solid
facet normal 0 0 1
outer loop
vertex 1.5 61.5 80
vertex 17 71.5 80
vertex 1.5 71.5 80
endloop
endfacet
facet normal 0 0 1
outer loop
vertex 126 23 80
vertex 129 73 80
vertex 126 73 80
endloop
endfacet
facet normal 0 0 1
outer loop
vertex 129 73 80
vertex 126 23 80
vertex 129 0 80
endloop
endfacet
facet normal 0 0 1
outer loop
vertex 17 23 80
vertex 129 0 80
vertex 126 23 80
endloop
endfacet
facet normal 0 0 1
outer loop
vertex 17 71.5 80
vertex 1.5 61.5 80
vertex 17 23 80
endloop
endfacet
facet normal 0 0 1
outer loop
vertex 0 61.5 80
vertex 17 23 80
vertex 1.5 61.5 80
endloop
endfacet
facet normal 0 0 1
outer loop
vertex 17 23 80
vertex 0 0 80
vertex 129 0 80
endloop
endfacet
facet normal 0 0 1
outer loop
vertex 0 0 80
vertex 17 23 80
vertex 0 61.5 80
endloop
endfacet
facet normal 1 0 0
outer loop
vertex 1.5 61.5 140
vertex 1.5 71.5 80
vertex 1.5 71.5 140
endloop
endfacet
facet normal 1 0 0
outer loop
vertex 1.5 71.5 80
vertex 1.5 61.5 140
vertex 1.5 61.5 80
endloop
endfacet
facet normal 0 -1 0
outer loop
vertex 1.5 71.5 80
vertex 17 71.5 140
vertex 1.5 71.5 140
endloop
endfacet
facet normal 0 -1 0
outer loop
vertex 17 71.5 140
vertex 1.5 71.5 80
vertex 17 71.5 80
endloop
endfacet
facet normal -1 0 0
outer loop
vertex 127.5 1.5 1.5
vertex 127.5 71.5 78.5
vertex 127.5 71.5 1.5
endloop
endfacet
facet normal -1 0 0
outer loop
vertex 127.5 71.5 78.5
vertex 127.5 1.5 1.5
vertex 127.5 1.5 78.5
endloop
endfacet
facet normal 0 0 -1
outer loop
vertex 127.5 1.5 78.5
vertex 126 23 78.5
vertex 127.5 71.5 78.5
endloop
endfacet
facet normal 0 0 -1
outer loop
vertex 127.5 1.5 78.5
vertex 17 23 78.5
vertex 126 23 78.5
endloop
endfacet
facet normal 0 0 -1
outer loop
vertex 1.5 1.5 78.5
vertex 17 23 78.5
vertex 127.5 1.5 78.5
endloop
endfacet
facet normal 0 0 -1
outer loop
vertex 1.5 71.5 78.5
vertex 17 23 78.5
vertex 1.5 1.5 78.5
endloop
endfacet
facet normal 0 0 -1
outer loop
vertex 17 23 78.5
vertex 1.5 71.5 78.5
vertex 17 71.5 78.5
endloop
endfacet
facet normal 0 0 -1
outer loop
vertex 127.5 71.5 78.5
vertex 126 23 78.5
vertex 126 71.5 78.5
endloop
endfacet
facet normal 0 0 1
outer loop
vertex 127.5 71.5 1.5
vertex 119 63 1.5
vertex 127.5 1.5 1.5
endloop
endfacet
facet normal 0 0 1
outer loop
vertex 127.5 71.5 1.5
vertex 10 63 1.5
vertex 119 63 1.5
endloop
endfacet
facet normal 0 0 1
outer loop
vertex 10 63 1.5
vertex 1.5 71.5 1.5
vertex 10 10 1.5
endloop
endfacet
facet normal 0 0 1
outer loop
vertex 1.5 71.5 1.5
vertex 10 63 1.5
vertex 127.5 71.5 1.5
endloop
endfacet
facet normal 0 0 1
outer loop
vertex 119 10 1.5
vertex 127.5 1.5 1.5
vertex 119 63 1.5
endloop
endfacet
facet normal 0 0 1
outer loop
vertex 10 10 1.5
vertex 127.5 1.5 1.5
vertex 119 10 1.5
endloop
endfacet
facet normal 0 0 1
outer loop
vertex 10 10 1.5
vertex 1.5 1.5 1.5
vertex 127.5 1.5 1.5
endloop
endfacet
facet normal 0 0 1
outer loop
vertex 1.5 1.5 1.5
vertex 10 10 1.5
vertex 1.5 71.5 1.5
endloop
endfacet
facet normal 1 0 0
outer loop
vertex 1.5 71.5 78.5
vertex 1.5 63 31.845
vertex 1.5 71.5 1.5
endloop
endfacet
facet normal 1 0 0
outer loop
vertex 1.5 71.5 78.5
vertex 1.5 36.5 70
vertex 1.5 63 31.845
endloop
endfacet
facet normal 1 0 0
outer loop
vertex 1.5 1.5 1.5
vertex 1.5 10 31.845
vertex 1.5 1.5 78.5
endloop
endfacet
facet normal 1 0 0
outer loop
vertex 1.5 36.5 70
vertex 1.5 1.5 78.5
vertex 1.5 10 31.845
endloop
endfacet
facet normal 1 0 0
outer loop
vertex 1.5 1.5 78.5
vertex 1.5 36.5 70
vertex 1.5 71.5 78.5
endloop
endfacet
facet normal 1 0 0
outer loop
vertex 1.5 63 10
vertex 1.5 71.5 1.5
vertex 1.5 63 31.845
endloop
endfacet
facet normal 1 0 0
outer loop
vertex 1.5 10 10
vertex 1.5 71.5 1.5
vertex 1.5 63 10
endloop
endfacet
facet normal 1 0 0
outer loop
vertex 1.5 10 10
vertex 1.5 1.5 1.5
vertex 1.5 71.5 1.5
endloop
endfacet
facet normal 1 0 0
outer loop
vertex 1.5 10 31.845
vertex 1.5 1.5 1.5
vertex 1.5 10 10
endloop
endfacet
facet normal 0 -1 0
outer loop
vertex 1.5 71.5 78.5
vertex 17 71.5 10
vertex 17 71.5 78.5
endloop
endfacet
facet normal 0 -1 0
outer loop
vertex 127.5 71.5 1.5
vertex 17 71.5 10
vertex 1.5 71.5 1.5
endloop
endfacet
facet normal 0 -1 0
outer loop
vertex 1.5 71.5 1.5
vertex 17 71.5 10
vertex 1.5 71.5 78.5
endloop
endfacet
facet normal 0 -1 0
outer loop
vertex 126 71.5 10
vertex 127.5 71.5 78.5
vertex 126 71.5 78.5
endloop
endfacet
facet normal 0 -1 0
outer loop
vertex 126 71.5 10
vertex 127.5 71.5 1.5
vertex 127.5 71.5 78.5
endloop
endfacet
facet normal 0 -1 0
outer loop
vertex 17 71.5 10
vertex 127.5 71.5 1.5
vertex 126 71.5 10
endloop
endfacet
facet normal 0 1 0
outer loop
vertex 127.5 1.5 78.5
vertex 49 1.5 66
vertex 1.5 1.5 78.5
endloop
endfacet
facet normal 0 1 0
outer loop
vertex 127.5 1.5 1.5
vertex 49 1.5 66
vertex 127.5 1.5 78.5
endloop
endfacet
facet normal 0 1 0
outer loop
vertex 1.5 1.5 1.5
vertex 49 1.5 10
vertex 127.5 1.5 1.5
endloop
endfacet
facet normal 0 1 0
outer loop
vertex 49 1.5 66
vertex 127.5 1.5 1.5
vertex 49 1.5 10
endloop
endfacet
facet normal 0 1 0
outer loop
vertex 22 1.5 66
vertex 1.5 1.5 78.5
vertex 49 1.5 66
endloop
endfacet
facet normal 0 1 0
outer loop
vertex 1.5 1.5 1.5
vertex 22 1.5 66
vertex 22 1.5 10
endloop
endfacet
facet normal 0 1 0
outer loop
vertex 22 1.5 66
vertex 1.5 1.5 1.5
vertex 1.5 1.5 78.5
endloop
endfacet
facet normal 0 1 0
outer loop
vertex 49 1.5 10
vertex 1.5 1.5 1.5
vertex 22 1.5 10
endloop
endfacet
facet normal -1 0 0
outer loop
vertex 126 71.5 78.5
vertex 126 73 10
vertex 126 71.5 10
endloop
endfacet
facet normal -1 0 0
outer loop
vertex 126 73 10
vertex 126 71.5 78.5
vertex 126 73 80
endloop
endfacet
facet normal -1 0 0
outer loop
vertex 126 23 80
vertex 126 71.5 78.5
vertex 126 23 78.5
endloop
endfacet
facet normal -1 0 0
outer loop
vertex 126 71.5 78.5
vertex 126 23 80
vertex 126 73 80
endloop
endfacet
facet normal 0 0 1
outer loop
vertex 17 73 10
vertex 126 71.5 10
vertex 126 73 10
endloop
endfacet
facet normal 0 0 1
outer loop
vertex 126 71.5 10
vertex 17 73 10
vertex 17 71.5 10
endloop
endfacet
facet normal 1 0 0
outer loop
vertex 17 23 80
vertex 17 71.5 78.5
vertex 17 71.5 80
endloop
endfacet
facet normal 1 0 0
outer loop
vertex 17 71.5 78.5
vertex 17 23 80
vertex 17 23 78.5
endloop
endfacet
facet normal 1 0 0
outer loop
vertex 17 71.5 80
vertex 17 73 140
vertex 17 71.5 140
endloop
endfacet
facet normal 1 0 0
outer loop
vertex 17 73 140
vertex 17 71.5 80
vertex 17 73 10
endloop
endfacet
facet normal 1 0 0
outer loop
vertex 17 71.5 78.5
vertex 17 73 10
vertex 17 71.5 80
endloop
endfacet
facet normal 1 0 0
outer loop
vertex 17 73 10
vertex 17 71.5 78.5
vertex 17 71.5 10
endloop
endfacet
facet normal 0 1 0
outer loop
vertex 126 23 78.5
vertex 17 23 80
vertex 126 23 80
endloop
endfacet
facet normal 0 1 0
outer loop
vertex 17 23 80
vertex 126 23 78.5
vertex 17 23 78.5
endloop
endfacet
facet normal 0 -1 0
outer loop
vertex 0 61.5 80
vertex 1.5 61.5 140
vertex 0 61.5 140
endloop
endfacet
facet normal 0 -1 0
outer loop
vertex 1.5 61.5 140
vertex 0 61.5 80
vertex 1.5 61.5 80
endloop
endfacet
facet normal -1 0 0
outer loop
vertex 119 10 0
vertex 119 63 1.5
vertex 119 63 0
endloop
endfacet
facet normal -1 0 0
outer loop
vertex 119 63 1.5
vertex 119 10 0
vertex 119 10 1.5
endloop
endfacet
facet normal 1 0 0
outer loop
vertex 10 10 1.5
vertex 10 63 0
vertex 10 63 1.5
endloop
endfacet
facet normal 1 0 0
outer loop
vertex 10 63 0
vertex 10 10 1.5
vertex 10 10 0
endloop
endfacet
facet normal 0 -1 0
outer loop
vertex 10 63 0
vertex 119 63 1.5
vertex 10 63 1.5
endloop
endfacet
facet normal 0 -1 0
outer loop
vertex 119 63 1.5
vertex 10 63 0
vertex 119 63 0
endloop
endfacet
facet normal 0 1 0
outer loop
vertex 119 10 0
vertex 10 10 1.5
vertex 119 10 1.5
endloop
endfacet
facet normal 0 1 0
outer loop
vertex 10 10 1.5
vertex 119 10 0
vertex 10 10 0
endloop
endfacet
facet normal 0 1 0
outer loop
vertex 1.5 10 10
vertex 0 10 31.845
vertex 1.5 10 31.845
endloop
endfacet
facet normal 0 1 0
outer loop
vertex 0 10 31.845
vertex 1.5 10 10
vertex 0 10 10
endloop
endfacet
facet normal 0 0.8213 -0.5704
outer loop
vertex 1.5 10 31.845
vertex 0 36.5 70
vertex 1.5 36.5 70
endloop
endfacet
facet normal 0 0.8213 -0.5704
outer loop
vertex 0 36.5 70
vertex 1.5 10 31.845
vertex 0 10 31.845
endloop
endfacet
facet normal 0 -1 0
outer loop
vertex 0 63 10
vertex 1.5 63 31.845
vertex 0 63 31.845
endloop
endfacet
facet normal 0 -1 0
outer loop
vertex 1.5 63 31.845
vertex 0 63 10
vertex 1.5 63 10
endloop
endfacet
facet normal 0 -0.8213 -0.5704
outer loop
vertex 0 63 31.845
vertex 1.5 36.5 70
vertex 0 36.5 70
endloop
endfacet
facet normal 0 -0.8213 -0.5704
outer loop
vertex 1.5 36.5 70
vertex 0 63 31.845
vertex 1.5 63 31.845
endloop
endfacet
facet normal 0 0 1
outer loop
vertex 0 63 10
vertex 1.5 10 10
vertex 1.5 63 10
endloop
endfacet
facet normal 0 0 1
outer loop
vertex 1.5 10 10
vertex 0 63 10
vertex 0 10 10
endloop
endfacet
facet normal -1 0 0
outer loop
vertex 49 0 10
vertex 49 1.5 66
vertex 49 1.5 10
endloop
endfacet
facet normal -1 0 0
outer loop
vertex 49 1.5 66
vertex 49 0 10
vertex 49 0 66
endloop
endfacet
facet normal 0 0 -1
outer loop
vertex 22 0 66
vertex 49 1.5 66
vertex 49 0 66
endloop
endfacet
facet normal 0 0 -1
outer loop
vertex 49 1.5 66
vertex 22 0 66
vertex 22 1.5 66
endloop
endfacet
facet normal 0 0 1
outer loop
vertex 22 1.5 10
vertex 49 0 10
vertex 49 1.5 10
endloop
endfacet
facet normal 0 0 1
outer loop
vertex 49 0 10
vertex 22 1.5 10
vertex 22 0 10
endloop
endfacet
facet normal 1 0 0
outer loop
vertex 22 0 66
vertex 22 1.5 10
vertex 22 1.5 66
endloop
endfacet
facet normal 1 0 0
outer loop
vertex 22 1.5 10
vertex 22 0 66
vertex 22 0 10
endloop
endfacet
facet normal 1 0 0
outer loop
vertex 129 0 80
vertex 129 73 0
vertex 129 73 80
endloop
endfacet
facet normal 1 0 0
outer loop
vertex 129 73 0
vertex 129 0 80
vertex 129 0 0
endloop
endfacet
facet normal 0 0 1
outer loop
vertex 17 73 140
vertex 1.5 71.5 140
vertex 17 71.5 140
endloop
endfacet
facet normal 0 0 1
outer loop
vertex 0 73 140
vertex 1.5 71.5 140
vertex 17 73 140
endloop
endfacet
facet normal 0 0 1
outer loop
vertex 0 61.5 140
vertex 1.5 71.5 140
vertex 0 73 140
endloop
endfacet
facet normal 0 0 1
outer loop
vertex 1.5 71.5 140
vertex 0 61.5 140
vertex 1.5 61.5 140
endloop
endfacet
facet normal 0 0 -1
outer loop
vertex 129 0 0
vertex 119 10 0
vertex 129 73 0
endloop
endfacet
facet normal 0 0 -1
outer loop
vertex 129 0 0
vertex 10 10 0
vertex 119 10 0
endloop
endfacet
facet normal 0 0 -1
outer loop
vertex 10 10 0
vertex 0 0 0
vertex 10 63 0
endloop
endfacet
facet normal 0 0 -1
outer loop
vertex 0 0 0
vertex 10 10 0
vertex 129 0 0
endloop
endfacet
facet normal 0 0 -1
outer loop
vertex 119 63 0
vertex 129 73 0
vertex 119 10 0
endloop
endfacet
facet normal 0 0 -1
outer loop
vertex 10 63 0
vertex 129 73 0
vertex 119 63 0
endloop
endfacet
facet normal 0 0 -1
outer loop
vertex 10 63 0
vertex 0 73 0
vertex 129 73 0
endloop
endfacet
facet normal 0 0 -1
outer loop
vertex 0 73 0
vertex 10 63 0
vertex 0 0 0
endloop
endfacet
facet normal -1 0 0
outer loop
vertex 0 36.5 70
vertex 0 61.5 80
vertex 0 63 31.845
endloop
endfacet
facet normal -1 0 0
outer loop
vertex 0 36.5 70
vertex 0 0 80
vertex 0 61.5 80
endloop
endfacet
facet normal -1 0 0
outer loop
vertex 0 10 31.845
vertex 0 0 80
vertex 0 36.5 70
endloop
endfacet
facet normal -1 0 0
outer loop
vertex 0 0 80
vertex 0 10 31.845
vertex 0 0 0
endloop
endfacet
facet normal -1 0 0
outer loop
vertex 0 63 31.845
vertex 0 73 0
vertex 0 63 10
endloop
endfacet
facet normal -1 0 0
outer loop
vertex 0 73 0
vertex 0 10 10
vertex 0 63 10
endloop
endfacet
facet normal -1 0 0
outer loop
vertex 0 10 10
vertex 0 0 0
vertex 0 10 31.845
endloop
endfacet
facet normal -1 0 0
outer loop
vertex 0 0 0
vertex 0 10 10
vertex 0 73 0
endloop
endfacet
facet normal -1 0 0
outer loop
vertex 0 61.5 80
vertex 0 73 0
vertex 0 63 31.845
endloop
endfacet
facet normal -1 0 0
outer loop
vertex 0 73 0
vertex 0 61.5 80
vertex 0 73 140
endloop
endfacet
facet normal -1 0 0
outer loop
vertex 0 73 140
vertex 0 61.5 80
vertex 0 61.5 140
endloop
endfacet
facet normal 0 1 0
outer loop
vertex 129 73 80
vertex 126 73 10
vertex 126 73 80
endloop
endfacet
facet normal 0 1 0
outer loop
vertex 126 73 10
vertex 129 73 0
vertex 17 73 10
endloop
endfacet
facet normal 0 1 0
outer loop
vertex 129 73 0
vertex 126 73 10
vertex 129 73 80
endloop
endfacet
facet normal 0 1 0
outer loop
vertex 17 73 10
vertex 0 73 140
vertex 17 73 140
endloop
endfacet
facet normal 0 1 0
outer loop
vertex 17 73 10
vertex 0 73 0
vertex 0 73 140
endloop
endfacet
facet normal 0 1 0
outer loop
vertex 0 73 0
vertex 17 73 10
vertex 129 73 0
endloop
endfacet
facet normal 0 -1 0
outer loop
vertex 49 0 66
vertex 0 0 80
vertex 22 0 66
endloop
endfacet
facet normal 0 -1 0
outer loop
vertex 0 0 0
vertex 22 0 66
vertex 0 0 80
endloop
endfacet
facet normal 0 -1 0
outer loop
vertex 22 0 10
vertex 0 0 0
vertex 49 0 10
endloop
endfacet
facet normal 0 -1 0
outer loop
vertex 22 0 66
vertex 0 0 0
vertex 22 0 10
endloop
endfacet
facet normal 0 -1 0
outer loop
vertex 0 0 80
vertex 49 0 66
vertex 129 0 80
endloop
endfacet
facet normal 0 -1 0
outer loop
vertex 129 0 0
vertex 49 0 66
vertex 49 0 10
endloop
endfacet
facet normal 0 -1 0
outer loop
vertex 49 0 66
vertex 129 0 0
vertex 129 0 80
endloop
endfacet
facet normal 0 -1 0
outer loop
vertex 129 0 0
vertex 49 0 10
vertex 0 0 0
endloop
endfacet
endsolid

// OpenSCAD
use <MCAD/boxes.scad>
$fa=1;
$fs=0.4;
wall_thickness=1.5;
box_length=129;
box_width=73;
box_height=140;
box_front_height=80;
powersupply_width=50;
powersupply_length=109;
front_rim_width=box_width - powersupply_width;
generic_rim=10;
generic_rim_height=generic_rim;
generic_rim_width=generic_rim;
side_rim_width_left=17;
side_rim_width_right=box_length-powersupply_length-side_rim_width_left;
overhang_angle=50;
h_domku=box_front_height-2*generic_rim_height;
domku_width=box_width-2*generic_rim_width;
h_daszka=h_domku-domku_width/2*tan(90-overhang_angle-0.5);
socket_length=27;
socket_height=56;
socket_offset_x=22; 
socket_offset_z=10;
//roundedBox(size=[129,73,140],radius=1,sidesonly=true);

difference(){
    cube([box_length,box_width, box_height], false); //base cube
    union(){
        // kostka drążąca górna:
        translate([wall_thickness,wall_thickness,box_front_height]){
            cube([
                box_length-2*wall_thickness,
                box_width-2*wall_thickness,
                box_height - box_front_height+3*wall_thickness
            ], false); 
        }
        // kostka drążąca dolna
        translate([wall_thickness,wall_thickness,wall_thickness]){
            cube([box_length-2*wall_thickness,box_width-2*wall_thickness,box_front_height-2*wall_thickness], false); 
        }
        translate([side_rim_width_left,front_rim_width,generic_rim_height]){
            cube([powersupply_length, powersupply_width+2*wall_thickness, box_height], false); // kostka drążąca msce na zasilacz
        }
        translate([-wall_thickness,-wall_thickness,box_front_height]){
            cube([
                box_length+2*wall_thickness,
                box_width-generic_rim_width,
                box_height - box_front_height+3*wall_thickness
            ], false); // kostka drążąca górna odsłaniająca front
        }
        // skosic prawy słupek
        translate([side_rim_width_left,4*wall_thickness,box_front_height]){
            cube([
                box_length,
                box_width,
                box_height - box_front_height+3*wall_thickness
            ], false); // kostka drążąca górna
        }        
        // dziura w podłodze:
        translate([generic_rim,generic_rim_width,-2*wall_thickness]){
            cube([box_length-2*generic_rim, box_width-2*generic_rim_width, box_height - box_front_height - 2*wall_thickness], false);
        }
        // dziura domkowa w lewej sciance:
        translate([-2*wall_thickness,generic_rim_width,generic_rim_height]){
            rotate([90,0,90])
            linear_extrude(height = 4*wall_thickness, center = false, convexity = 10, twist = 0)
            polygon(points=[[0,0],[domku_width,0],[domku_width,h_domku-h_daszka],[domku_width/2,h_domku], [0,h_domku-h_daszka]]);
        }
        // dziura na gniazdo zasilania 
        translate([socket_offset_x,-wall_thickness,socket_offset_z]){
            cube([socket_length,4*wall_thickness,socket_height], false); 
        }

    }
}

/*difference() {
    cube(30, center=true);
    sphere(20);
}
translate([0, 0, 30]) {
    cylinder(h=40, r=10);
}
#box(3,4,5);
*/
